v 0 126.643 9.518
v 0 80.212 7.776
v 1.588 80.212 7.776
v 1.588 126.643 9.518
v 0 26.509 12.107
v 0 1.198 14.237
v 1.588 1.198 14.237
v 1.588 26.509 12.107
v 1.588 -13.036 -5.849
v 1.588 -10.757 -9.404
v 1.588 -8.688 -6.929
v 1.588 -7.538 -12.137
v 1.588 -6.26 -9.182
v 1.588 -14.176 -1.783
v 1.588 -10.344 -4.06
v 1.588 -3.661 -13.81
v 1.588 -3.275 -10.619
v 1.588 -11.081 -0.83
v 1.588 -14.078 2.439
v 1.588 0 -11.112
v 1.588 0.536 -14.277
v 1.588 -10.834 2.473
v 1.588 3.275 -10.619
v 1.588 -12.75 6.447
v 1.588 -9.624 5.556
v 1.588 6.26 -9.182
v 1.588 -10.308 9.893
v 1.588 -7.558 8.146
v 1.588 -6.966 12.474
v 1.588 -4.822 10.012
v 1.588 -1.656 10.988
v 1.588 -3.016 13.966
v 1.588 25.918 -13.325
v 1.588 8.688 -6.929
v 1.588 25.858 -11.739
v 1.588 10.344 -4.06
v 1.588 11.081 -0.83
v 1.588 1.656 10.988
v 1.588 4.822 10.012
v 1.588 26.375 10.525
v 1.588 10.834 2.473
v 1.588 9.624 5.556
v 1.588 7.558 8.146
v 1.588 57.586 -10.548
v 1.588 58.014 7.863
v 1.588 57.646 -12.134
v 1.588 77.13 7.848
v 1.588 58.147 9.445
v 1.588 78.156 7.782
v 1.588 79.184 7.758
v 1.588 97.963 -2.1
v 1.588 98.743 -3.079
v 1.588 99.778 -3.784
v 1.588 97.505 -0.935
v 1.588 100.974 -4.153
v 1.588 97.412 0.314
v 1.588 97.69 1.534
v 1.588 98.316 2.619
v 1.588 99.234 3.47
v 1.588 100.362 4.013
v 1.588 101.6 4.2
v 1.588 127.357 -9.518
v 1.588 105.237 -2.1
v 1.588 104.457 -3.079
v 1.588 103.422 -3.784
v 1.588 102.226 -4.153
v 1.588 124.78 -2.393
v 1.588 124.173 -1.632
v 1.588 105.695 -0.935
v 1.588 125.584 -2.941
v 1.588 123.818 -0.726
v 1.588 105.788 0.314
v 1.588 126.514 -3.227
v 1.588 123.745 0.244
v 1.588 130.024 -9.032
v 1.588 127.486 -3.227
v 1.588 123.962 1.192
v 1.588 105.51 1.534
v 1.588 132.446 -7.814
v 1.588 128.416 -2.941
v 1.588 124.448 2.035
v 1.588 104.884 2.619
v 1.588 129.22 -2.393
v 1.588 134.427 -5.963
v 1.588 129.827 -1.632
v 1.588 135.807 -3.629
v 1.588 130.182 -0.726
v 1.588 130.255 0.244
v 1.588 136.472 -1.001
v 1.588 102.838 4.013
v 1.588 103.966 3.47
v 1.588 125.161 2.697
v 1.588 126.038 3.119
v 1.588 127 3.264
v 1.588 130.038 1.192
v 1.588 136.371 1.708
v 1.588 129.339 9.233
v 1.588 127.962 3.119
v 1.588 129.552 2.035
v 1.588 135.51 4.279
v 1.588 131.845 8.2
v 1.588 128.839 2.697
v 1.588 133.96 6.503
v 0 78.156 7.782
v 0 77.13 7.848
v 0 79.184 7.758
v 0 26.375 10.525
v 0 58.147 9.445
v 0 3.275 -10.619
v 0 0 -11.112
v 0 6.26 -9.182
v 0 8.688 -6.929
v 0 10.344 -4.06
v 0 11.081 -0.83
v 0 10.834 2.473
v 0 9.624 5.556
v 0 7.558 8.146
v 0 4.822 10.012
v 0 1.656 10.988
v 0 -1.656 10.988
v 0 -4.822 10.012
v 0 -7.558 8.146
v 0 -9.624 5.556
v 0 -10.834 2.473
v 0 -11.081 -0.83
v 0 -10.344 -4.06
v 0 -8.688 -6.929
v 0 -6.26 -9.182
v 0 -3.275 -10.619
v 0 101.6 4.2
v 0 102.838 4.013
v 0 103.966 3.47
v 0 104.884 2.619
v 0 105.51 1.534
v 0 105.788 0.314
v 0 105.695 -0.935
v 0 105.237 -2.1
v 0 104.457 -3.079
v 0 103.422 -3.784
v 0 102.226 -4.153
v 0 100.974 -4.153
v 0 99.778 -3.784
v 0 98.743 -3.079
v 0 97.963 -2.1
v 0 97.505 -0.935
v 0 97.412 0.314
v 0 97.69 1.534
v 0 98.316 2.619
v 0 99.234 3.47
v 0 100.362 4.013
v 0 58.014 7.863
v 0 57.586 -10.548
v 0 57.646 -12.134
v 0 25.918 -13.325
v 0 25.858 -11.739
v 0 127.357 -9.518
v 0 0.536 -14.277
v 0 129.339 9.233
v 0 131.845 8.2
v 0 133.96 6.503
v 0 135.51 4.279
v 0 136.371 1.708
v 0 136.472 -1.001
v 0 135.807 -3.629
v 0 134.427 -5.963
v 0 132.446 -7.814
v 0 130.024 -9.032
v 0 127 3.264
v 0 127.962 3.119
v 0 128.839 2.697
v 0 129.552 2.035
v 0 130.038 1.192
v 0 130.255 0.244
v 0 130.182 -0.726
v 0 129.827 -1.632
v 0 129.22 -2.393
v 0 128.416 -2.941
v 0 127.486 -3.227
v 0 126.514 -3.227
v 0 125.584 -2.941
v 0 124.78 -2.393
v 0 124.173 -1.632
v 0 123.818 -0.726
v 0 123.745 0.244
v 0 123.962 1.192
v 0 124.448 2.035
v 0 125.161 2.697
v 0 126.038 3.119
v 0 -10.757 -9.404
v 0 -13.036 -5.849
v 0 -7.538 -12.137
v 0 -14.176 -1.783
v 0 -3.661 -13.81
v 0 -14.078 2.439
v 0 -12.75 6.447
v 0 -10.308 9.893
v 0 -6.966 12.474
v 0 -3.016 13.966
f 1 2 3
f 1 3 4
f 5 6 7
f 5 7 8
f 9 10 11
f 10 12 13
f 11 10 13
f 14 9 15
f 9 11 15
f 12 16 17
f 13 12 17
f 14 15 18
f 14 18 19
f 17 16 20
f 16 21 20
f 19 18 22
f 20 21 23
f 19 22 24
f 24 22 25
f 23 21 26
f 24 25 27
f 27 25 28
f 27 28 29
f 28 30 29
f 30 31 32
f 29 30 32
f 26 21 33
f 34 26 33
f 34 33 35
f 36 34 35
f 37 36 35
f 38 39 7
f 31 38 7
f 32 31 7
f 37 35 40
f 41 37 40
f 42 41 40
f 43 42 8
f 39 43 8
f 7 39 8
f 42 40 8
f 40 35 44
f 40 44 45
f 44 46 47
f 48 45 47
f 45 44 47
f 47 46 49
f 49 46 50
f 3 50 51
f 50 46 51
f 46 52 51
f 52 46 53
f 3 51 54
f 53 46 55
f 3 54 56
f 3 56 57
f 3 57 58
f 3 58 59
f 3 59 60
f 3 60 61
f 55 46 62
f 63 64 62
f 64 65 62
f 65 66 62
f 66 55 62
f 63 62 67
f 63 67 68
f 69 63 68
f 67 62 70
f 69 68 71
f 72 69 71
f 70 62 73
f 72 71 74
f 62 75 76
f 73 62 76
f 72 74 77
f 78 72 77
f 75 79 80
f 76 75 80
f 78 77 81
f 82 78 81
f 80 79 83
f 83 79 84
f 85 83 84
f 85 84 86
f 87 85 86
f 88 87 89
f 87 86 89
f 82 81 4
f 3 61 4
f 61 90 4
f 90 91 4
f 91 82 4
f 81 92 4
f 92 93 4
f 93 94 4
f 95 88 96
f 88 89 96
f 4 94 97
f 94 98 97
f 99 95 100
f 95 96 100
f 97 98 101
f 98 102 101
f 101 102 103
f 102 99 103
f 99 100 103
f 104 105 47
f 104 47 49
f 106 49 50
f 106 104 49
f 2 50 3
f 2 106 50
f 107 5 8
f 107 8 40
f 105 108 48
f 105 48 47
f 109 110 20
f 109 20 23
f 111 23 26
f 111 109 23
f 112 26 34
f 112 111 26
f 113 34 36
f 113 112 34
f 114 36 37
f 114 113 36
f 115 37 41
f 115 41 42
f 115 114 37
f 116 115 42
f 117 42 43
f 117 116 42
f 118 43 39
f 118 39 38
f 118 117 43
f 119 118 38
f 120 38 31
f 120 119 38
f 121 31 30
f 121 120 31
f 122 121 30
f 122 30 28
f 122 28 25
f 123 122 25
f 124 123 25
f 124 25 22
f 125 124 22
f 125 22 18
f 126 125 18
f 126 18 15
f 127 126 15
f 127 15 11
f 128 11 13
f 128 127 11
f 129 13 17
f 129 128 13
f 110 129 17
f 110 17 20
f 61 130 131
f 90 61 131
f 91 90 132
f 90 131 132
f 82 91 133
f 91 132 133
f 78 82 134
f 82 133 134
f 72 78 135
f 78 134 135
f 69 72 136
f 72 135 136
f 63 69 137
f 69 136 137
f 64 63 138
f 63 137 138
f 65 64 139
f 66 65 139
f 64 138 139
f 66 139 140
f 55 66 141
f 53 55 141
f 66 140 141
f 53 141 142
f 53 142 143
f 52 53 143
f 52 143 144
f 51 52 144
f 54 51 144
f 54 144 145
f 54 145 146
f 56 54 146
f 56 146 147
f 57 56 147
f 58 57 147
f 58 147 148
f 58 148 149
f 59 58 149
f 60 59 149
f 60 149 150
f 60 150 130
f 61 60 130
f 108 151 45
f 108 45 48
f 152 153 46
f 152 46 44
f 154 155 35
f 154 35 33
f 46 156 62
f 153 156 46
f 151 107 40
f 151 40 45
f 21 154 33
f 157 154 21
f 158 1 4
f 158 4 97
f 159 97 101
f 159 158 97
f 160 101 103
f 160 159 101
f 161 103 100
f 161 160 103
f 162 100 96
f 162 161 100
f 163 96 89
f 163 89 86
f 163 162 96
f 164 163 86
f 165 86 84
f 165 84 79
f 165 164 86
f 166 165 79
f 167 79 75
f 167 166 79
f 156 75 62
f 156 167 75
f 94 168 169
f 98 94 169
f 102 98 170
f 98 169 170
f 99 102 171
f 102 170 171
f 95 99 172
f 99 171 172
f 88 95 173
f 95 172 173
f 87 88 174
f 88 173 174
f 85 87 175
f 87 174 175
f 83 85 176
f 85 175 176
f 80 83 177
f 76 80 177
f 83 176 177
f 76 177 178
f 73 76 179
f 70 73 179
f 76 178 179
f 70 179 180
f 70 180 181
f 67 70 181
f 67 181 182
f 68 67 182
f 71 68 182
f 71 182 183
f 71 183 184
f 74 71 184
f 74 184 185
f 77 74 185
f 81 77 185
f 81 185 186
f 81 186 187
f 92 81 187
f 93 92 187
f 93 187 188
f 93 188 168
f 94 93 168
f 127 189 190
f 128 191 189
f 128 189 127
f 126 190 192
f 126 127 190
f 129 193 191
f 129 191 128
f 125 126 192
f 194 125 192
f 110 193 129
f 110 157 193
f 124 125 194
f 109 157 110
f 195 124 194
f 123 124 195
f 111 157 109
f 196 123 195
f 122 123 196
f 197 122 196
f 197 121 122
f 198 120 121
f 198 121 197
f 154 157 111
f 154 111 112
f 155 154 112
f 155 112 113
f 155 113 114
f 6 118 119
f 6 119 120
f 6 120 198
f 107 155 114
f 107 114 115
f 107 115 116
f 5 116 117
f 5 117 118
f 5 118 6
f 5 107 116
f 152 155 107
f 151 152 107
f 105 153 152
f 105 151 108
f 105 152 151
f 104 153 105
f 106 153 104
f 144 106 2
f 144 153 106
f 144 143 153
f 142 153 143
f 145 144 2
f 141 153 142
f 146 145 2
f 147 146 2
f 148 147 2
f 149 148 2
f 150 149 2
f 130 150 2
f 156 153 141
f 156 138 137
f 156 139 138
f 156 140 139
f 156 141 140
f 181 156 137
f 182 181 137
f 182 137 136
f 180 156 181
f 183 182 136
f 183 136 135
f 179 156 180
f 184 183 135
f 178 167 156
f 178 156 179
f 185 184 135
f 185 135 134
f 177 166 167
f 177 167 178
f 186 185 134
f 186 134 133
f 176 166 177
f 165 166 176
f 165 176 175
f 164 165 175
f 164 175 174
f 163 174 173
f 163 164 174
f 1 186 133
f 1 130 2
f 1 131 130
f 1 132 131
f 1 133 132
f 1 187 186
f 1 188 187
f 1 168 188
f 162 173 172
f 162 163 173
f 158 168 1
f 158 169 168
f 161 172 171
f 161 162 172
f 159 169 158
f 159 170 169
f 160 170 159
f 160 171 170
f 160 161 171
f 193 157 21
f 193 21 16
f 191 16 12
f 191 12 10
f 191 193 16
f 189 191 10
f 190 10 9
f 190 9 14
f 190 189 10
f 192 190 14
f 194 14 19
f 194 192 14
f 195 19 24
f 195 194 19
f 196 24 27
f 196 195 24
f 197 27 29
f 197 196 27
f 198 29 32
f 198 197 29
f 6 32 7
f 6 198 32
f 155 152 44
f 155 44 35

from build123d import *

# Parameters (mm, degrees)
SKETCH1_R               = 11.1125
BOSS_EXTRUDE1_DEPTH     = 1.5875
F_1_4_CLEARANCE_HOLE1_D = 6.5278
M8_CLEARANCE_HOLE1_D    = 8.4


with BuildPart() as part:
    # Sketch1 → Boss-Extrude1 (new body)
    with BuildSketch(Plane(origin=(0, 0, 0), x_dir=(0, 0, -1), z_dir=(1, 0, 0))):
        with BuildLine():
            Line((9.518300378, 127.3571875), (12.134325567, 57.645583519))
            Line((12.134325567, 57.645583519), (10.547942171, 57.586052269))
            Line((10.547942171, 57.586052269), (11.738567171, 25.858384342))
            Line((11.738567171, 25.858384342), (13.324950567, 25.917915592))
            Line((13.324950567, 25.917915592), (14.277450567, 0.53578125))
            ThreePointArc((14.277450567, 0.53578125), (-0.331752192, -14.283647879), (-14.237180291, 1.198062439))
            Line((-14.237180291, 1.198062439), (-12.107291511, 26.508605179))
            Line((-12.107291511, 26.508605179), (-10.52538259, 26.37548713))
            Line((-10.52538259, 26.37548713), (-7.863021614, 58.013665555))
            Line((-7.863021614, 58.013665555), (-9.444930535, 58.146783604))
            Line((-9.444930535, 58.146783604), (-7.84751395, 77.129690658))
            ThreePointArc((-7.84751395, 77.129690658), (-7.764904905, 78.669797764), (-7.775922348, 80.212079439))
            Line((-7.775922348, 80.212079439), (-9.518300378, 126.6428125))
            ThreePointArc((-9.518300378, 126.6428125), (-0.3571875, 136.518300378), (9.518300378, 127.3571875))
        make_face()
        Circle(SKETCH1_R, mode=Mode.SUBTRACT)
    extrude(amount=BOSS_EXTRUDE1_DEPTH)

    # 1/4 Clearance Hole1 (through all)
    with Locations(Plane(origin=(1.5875, 0, 0), x_dir=(0, 0, -1), z_dir=(1, 0, 0))):
        with Locations((0, 127)):
            Hole(F_1_4_CLEARANCE_HOLE1_D / 2)

    # M8 Clearance Hole1 (through all)
    with Locations(Plane(origin=(1.5875, 0, 0), x_dir=(0, 0, -1), z_dir=(1, 0, 0))):
        with Locations((0, 101.6)):
            Hole(M8_CLEARANCE_HOLE1_D / 2)


solid = part.part
